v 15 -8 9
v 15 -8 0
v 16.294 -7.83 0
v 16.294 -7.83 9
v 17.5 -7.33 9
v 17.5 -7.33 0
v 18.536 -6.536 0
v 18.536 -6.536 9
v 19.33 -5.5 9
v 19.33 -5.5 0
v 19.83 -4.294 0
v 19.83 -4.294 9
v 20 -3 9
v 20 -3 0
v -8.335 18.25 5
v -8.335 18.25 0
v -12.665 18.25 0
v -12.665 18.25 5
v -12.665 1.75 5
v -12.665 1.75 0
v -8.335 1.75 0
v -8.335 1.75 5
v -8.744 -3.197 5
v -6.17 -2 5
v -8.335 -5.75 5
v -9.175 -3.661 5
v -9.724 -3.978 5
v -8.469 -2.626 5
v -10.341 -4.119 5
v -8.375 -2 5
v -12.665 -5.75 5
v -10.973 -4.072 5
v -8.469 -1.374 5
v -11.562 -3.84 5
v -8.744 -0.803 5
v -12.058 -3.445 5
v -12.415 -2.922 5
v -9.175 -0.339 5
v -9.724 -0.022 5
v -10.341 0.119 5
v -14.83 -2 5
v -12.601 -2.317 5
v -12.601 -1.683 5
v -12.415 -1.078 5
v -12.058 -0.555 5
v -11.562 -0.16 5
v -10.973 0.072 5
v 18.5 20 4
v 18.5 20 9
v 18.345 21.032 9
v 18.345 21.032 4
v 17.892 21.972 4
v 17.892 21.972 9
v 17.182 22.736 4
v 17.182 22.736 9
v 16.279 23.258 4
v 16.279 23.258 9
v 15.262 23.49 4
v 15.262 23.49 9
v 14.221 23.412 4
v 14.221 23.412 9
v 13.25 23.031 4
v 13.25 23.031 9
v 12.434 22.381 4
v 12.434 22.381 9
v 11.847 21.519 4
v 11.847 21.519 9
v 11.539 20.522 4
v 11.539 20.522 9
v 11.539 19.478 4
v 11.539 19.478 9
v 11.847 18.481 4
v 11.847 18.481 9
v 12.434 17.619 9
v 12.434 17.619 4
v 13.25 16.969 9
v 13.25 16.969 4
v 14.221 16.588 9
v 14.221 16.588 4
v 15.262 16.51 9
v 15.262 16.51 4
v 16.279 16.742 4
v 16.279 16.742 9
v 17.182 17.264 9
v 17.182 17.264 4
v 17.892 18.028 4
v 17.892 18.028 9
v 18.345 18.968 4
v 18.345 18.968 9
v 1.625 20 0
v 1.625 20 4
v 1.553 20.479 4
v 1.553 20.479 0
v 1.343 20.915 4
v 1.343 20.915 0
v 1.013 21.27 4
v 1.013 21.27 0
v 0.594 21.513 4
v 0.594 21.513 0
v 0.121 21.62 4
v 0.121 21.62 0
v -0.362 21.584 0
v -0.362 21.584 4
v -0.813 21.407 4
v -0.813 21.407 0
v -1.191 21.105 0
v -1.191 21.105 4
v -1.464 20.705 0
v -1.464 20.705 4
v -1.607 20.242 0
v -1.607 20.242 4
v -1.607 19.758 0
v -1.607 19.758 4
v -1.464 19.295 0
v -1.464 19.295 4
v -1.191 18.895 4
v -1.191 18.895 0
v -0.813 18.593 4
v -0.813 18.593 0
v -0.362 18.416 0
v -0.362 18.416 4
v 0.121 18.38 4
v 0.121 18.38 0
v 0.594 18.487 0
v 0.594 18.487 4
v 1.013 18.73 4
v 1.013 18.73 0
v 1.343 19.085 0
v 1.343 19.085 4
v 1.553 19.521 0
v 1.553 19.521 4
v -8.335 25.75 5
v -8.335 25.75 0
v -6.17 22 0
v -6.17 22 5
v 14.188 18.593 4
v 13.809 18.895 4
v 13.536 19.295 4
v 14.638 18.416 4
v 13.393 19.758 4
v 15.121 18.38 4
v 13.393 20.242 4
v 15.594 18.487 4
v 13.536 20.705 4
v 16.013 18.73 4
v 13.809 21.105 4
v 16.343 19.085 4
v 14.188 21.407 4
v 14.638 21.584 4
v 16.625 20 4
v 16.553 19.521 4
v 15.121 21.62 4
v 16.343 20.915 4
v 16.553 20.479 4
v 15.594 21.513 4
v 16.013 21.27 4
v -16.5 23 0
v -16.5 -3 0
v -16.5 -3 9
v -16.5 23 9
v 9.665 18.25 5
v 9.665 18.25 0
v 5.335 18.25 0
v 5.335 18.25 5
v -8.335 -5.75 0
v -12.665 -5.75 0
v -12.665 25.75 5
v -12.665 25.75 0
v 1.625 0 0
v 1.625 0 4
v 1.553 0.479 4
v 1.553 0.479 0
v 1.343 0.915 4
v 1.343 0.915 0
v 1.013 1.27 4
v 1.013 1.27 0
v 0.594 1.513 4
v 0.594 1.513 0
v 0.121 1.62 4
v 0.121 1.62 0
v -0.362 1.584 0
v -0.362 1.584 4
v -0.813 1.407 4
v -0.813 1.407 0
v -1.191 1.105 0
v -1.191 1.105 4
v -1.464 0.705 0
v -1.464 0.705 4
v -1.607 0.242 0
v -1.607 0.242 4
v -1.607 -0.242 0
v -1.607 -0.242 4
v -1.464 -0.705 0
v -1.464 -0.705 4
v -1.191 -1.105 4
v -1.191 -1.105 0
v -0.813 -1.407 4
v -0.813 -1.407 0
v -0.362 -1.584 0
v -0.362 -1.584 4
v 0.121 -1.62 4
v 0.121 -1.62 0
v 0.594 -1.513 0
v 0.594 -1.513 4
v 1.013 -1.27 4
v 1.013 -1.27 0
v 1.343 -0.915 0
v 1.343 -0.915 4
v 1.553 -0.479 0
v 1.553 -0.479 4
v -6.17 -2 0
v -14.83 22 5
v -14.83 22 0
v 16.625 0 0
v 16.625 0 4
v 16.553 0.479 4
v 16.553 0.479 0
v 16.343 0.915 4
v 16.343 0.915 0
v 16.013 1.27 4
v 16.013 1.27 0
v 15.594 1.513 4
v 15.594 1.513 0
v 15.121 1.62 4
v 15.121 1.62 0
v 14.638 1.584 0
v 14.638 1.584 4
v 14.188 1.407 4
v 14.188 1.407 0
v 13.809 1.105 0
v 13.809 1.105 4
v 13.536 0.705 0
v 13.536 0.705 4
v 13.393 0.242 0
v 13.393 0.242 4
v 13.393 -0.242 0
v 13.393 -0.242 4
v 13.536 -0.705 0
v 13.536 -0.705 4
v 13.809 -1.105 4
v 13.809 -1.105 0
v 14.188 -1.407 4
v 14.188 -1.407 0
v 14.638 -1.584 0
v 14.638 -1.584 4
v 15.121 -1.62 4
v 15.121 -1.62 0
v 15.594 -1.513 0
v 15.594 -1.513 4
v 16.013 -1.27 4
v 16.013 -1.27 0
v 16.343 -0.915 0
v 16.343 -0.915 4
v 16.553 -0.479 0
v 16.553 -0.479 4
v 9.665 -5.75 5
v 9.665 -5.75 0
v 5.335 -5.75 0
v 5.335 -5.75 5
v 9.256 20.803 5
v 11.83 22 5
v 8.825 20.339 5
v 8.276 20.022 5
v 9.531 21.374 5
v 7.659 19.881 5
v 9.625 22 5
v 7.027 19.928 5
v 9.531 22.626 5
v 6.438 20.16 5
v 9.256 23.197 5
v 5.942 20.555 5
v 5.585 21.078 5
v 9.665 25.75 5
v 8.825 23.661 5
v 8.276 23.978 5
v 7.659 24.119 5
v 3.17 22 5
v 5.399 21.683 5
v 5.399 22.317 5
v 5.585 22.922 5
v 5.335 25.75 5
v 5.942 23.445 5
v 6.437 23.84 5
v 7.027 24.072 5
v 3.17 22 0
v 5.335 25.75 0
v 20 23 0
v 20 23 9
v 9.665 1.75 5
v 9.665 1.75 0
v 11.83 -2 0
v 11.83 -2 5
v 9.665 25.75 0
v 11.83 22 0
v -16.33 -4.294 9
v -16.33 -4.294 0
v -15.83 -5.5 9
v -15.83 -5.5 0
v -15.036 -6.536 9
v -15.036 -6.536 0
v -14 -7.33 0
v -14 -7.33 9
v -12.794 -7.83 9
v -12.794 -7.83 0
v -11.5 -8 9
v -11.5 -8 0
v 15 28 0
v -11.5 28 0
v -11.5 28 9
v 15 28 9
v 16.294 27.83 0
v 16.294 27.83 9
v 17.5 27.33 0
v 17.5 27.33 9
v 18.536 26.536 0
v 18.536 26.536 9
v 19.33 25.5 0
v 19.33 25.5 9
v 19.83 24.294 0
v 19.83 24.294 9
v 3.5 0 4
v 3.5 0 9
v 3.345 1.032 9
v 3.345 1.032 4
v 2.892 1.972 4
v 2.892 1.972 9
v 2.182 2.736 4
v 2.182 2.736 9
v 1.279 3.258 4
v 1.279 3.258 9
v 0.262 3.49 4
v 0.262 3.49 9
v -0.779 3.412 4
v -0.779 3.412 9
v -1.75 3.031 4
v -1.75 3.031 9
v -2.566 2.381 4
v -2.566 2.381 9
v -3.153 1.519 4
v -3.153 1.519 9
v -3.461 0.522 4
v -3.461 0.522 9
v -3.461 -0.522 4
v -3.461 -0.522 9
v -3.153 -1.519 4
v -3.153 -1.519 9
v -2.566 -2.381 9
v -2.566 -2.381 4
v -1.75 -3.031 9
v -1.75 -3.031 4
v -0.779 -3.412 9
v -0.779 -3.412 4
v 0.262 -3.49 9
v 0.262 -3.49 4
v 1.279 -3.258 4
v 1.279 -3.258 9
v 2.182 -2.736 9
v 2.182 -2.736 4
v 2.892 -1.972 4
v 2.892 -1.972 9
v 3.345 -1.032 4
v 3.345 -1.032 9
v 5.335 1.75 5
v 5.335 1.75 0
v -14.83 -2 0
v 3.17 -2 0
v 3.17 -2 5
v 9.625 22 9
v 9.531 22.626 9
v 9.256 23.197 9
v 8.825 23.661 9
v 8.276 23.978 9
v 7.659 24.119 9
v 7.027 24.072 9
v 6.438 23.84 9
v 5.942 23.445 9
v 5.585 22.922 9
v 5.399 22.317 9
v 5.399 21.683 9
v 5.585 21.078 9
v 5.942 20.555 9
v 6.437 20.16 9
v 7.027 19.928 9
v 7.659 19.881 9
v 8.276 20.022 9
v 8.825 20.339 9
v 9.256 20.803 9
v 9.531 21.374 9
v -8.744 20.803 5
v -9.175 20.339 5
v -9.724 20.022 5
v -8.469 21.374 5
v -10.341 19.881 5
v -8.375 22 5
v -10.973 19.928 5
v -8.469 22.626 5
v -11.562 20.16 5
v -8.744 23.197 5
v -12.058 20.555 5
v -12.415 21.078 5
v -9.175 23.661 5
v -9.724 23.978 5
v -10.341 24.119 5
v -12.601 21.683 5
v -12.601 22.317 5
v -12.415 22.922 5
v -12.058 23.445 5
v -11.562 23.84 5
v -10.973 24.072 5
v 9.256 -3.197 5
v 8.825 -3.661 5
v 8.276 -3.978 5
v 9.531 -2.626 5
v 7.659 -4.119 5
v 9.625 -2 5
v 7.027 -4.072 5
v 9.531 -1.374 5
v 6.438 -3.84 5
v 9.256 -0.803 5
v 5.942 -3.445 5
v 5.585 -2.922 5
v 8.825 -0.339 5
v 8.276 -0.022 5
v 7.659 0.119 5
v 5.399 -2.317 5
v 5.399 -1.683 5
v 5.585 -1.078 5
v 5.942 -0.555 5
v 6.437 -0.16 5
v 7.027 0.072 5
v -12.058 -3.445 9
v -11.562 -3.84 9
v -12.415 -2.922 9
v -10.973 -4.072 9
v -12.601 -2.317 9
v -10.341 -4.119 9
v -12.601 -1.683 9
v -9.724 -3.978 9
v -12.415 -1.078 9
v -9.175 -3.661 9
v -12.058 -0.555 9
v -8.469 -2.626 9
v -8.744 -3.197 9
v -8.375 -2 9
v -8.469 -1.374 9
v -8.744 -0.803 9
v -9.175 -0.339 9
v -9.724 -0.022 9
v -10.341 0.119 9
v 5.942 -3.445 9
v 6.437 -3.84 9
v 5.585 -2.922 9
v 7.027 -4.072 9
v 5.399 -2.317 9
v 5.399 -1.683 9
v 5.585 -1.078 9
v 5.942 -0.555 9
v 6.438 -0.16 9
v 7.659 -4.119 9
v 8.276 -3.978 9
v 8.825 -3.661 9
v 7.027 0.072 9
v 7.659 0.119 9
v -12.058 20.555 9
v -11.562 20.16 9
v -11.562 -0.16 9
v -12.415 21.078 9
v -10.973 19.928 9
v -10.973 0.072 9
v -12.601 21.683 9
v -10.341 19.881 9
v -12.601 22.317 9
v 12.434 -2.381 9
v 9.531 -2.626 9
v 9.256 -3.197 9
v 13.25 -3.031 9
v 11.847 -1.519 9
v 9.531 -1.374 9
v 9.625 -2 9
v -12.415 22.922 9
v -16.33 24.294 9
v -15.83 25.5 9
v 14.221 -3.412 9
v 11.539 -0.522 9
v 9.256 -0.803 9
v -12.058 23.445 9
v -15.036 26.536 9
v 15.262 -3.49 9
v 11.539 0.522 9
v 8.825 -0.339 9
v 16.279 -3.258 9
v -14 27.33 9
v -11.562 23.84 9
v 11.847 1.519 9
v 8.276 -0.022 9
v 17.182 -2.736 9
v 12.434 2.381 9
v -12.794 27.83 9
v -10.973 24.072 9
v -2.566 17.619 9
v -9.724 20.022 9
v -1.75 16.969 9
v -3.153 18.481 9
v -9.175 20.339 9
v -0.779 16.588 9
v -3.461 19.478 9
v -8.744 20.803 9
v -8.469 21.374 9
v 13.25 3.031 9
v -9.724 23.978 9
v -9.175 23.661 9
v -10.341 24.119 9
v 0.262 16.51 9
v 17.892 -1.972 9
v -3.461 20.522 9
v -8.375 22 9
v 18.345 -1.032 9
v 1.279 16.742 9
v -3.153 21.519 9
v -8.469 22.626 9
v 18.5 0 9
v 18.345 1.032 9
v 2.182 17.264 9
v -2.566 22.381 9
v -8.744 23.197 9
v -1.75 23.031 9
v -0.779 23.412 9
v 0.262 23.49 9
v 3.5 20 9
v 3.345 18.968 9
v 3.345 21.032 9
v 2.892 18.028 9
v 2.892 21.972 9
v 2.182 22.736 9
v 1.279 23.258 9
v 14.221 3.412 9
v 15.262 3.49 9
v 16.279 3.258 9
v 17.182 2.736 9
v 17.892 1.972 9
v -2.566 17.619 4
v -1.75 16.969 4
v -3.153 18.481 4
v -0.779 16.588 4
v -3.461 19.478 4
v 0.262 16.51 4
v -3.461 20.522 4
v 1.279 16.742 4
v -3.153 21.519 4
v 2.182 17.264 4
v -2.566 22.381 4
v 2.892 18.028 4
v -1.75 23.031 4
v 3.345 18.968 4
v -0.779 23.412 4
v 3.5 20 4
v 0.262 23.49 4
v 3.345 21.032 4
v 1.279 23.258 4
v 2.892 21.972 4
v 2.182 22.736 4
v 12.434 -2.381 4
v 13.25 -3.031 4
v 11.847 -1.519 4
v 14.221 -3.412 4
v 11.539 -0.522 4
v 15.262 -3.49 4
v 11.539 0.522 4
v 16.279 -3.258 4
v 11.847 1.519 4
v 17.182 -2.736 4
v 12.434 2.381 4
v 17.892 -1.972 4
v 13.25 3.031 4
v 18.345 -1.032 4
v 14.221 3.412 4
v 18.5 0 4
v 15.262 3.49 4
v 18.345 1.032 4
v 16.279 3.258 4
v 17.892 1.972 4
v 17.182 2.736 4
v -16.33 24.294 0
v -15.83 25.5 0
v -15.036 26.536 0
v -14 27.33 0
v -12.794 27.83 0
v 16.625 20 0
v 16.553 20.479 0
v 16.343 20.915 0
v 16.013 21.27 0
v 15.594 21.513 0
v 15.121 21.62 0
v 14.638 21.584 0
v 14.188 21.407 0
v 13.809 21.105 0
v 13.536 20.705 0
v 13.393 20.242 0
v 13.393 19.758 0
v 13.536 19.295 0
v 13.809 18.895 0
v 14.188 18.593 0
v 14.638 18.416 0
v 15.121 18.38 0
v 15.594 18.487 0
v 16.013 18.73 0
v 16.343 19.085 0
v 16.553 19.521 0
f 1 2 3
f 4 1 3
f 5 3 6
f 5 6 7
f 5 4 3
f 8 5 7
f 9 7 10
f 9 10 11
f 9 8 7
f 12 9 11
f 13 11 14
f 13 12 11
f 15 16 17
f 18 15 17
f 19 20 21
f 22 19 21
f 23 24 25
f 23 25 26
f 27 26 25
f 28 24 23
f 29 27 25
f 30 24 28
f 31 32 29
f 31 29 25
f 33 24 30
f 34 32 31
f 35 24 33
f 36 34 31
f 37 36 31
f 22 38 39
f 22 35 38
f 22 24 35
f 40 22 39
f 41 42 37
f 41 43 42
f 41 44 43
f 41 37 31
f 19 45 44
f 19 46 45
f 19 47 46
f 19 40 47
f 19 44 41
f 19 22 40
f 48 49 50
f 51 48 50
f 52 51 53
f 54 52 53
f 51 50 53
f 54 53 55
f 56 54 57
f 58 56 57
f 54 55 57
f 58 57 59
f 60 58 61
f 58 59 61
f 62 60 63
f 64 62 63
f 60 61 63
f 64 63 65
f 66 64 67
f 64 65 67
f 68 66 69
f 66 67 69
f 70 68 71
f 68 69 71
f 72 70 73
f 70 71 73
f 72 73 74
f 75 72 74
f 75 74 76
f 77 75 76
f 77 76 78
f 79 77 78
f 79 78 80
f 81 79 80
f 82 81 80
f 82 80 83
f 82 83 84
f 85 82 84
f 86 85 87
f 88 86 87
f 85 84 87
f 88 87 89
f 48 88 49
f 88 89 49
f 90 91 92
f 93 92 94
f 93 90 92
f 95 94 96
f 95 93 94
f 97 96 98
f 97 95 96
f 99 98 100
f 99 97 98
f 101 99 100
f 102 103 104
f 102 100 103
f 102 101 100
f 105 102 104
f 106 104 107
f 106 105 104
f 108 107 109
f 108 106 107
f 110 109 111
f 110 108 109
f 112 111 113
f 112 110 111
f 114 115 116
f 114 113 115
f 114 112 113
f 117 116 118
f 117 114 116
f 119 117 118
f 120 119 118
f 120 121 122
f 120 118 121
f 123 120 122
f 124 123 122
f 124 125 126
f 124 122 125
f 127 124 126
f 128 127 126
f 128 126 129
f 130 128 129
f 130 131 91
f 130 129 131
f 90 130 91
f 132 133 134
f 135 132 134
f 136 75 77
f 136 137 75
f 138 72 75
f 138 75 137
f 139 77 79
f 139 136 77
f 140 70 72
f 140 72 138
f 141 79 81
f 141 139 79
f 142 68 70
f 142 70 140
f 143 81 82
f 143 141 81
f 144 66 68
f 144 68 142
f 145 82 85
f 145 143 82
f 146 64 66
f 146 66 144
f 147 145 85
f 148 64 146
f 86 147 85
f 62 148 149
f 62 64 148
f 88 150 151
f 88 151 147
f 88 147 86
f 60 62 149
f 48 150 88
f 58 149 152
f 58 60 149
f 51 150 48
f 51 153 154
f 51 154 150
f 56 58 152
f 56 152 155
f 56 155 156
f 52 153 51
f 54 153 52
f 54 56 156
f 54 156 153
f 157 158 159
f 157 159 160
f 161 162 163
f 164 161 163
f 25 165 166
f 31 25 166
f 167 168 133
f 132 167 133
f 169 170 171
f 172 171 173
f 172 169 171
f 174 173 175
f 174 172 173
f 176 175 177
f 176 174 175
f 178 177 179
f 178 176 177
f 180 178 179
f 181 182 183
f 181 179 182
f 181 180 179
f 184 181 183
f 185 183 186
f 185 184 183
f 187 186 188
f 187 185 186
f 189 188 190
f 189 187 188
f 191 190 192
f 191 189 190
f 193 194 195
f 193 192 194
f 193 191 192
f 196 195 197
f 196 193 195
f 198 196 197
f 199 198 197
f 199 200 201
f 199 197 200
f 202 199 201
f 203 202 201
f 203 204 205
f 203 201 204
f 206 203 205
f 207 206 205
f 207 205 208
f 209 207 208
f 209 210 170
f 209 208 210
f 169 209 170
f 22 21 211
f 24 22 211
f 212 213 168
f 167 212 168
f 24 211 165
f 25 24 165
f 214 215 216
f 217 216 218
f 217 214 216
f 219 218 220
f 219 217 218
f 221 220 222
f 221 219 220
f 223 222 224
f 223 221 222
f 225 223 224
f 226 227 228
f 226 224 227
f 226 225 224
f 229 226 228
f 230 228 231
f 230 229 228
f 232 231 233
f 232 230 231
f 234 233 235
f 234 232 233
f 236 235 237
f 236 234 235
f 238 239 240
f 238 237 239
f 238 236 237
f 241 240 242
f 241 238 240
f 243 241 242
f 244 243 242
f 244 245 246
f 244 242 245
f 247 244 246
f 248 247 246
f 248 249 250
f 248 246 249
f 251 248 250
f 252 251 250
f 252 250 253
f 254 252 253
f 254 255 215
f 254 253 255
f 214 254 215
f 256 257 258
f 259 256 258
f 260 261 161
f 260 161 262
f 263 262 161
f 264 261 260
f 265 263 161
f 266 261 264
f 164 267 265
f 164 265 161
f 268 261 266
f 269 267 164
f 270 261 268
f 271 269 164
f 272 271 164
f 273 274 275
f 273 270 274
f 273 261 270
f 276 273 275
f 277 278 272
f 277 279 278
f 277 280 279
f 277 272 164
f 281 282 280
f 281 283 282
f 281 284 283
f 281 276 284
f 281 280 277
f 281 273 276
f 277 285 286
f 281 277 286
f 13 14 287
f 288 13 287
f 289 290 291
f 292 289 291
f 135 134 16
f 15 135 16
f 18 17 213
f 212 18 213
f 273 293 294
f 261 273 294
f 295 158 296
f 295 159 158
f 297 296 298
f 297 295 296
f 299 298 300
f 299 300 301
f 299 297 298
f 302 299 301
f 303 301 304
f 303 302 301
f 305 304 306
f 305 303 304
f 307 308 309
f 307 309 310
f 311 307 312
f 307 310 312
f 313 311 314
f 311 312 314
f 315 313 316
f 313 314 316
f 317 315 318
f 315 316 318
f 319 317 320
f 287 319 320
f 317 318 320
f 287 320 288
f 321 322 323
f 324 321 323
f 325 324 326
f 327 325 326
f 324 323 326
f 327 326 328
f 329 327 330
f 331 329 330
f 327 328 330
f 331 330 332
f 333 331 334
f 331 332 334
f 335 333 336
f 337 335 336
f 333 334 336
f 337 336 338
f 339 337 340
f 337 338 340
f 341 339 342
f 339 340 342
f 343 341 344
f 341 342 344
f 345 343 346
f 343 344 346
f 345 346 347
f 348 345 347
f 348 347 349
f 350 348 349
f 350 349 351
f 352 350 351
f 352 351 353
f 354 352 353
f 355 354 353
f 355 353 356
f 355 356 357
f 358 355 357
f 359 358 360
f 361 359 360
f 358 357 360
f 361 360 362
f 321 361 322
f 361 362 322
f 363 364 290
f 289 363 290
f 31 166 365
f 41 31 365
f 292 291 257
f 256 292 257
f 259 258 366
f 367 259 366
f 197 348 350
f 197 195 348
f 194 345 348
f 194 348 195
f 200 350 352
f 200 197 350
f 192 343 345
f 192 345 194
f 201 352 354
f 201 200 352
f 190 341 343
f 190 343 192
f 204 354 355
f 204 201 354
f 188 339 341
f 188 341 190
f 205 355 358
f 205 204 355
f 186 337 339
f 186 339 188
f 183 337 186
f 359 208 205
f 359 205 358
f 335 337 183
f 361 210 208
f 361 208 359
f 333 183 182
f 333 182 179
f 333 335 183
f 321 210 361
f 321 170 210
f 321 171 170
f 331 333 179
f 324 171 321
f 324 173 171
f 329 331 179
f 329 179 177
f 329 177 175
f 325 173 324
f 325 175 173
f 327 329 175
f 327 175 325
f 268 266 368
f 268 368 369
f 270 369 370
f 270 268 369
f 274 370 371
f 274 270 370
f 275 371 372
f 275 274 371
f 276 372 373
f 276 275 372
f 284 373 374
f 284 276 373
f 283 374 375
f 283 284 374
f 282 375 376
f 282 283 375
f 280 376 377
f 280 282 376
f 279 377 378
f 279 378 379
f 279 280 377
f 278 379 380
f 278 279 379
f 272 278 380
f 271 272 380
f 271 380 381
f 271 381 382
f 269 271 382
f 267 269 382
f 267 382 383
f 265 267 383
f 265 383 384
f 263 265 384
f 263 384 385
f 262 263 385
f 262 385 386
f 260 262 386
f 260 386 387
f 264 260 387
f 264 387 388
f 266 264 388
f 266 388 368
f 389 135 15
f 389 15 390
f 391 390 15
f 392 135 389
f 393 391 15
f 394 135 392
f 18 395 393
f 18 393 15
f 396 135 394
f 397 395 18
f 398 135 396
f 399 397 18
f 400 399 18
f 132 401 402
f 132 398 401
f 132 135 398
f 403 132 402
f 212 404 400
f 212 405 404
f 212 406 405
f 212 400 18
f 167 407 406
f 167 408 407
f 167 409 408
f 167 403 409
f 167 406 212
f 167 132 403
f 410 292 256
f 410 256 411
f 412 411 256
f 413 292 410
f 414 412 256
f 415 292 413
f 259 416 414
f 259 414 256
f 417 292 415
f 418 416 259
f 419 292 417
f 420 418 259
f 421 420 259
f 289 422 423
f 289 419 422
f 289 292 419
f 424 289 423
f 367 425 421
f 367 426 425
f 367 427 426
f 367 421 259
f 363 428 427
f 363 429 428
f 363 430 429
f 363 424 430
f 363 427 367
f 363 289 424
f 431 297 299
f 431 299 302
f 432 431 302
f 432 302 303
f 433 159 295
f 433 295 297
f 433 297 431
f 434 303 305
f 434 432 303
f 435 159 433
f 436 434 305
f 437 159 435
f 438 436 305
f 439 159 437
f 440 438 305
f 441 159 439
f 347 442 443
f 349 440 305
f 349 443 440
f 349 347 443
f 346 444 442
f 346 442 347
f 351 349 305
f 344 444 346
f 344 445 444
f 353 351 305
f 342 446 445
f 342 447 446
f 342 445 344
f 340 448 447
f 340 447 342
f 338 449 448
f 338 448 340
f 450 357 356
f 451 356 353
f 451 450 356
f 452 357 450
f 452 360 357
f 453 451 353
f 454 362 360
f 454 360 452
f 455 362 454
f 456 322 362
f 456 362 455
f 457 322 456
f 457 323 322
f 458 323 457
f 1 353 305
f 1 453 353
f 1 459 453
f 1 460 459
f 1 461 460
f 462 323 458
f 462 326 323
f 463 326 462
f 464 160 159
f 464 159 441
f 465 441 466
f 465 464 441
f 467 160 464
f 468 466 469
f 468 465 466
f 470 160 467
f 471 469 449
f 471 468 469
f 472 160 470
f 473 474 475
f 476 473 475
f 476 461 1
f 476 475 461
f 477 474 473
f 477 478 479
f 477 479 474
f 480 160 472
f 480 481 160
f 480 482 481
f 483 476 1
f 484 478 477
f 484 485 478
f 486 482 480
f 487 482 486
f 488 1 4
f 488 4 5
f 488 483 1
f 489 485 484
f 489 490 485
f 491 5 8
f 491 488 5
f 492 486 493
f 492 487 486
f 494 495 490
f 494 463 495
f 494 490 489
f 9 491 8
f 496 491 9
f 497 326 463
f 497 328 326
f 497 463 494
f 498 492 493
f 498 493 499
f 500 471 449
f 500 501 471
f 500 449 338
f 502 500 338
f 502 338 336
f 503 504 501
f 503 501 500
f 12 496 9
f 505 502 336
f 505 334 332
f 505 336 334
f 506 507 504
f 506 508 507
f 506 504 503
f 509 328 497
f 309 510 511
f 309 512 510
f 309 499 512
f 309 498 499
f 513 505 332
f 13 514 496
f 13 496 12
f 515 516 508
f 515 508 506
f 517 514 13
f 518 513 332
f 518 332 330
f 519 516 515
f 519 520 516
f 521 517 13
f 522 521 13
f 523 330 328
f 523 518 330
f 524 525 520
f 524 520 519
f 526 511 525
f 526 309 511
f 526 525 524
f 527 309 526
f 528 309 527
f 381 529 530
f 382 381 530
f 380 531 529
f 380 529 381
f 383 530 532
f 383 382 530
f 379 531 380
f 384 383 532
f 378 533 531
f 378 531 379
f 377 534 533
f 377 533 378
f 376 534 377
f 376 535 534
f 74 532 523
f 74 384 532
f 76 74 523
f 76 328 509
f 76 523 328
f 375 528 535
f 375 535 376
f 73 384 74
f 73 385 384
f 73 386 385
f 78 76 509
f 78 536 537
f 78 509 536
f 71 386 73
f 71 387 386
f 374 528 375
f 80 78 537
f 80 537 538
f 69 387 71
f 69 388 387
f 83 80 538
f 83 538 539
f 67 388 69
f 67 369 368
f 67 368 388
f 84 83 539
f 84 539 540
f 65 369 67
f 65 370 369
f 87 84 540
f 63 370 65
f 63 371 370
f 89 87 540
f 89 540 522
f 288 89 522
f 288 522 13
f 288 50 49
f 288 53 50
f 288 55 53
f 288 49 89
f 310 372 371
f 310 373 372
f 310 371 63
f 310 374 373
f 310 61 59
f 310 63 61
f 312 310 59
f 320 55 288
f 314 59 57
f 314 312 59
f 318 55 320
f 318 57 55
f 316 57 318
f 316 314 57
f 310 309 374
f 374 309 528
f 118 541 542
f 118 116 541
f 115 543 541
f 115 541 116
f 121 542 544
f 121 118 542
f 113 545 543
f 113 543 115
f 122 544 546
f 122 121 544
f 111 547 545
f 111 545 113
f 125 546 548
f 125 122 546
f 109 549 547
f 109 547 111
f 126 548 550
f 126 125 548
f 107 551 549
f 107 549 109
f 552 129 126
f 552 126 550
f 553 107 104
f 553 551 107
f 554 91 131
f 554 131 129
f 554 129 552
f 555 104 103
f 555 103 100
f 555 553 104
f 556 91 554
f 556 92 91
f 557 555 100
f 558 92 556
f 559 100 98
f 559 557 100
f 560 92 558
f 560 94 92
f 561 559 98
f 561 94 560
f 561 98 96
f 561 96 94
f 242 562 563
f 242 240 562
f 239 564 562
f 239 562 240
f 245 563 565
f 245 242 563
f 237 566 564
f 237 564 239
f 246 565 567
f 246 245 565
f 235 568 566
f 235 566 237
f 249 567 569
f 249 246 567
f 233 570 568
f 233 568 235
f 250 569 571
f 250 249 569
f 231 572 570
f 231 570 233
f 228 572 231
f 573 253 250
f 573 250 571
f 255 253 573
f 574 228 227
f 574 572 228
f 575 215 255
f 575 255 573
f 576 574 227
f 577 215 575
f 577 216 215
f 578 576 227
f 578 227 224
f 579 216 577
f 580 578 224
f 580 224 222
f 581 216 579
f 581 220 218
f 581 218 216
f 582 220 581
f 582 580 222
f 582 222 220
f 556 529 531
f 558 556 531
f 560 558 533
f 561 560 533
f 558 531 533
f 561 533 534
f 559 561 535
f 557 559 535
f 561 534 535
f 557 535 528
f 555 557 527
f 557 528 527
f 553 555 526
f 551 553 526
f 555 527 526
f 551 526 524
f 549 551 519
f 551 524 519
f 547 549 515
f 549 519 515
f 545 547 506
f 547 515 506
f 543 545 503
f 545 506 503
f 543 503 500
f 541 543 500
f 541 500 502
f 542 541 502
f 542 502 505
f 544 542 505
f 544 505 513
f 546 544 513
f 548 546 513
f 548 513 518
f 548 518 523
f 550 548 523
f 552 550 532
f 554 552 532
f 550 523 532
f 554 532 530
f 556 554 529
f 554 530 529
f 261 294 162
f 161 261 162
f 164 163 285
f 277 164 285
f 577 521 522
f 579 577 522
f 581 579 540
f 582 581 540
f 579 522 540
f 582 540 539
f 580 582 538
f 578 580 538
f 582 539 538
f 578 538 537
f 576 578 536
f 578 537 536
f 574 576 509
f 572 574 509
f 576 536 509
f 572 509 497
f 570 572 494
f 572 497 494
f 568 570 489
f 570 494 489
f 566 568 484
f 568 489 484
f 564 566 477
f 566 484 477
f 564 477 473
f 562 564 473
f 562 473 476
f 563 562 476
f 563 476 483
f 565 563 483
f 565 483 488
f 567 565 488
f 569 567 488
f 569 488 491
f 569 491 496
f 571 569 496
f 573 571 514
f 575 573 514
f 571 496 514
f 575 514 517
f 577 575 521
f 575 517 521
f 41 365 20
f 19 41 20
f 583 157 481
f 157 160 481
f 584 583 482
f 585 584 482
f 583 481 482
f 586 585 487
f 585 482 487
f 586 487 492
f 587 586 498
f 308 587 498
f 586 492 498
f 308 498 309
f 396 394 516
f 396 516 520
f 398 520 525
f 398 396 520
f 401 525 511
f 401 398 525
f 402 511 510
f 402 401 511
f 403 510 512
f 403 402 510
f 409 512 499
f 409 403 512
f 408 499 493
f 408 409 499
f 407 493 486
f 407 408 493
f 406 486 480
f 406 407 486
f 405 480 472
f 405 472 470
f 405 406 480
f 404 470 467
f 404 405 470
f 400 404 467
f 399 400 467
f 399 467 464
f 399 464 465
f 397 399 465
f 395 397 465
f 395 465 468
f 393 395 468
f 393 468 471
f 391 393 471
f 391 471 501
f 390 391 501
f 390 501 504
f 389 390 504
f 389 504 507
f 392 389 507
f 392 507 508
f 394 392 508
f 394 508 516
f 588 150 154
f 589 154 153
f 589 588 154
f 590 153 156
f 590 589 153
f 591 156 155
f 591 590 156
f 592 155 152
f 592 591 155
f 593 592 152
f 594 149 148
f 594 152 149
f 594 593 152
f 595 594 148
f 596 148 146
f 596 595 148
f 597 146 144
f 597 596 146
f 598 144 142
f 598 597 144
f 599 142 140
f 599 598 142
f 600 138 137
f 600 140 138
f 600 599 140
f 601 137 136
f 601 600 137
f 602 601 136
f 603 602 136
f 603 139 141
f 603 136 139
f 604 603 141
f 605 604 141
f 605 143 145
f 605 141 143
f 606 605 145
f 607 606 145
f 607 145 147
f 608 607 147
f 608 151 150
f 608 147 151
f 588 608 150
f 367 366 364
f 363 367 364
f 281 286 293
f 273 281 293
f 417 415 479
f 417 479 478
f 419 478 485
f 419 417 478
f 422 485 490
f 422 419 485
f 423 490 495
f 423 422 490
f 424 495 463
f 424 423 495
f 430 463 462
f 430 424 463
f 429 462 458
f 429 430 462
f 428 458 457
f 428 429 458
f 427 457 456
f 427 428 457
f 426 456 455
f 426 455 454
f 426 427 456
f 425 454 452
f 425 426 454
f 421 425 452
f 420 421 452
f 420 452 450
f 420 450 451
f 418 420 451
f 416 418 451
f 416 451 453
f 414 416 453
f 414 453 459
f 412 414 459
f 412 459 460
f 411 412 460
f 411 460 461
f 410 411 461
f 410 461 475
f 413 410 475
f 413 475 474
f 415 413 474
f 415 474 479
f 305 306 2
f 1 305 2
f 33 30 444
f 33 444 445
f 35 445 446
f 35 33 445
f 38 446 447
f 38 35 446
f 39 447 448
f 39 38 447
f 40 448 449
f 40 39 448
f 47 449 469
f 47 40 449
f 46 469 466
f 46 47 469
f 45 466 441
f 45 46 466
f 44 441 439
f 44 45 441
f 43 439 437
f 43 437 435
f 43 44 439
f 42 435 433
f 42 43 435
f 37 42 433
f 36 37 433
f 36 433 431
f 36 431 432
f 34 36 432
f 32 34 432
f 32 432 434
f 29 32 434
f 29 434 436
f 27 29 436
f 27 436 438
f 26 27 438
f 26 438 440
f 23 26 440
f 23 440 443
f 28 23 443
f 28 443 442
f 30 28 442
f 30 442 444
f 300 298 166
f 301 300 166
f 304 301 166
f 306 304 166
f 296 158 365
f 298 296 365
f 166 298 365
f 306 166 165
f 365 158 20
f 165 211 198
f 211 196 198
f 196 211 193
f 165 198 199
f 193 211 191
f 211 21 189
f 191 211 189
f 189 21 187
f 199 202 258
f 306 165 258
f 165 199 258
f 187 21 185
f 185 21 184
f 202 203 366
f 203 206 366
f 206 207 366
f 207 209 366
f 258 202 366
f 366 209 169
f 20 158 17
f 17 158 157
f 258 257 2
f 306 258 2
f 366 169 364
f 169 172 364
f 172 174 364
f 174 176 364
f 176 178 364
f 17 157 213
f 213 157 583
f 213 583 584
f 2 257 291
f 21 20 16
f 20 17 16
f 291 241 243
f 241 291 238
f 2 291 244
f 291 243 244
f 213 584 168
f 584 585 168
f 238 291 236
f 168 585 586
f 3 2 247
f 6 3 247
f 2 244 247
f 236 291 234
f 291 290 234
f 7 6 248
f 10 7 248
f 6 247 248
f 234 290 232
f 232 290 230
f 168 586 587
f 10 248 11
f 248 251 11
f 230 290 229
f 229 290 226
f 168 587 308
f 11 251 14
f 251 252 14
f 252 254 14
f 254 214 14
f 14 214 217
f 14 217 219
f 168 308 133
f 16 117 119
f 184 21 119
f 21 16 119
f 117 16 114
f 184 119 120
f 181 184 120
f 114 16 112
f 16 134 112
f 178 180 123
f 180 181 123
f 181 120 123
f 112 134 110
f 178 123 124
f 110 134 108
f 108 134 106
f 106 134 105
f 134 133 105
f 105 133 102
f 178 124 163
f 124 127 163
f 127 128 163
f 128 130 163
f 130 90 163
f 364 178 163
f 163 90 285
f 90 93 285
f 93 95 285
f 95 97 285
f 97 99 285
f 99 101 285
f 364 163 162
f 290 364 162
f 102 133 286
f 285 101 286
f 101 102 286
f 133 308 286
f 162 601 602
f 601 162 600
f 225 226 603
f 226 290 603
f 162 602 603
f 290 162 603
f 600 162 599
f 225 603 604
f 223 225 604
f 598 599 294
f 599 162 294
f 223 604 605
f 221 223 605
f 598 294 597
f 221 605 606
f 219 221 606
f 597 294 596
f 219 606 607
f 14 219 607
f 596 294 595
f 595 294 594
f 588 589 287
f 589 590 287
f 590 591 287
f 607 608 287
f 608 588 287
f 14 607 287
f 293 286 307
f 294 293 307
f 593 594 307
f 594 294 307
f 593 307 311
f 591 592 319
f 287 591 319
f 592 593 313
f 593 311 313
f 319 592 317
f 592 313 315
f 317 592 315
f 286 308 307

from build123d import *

# Parameters (mm, degrees)
SKETCH1_W           = 36.5
SKETCH1_H           = 36
SKETCH1_R           = 1.625
SKETCH1_R_2         = 2.125
BOSS_EXTRUDE1_DEPTH = 9
SKETCH2_R           = 3.5
CUT_EXTRUDE1_DEPTH  = 5
CUT_EXTRUDE2_DEPTH  = 5
FILLET2_R           = 5


with BuildPart() as part:
    # Sketch1 → Boss-Extrude1 (new body)
    with BuildSketch(Plane.XY):
        with Locations((1.75, 10)):
            Rectangle(SKETCH1_W, SKETCH1_H)
        with Locations((0, 20)):
            Circle(SKETCH1_R, mode=Mode.SUBTRACT)
        with Locations((15, 20)):
            Circle(SKETCH1_R, mode=Mode.SUBTRACT)
        with Locations((15, 0)):
            Circle(SKETCH1_R, mode=Mode.SUBTRACT)
        Circle(SKETCH1_R, mode=Mode.SUBTRACT)
        with Locations((-10.5, 22)):
            Circle(SKETCH1_R_2, mode=Mode.SUBTRACT)
        with Locations((7.5, 22)):
            Circle(SKETCH1_R_2, mode=Mode.SUBTRACT)
        with Locations((7.5, -2)):
            Circle(SKETCH1_R_2, mode=Mode.SUBTRACT)
        with Locations((-10.5, -2)):
            Circle(SKETCH1_R_2, mode=Mode.SUBTRACT)
    extrude(amount=BOSS_EXTRUDE1_DEPTH)

    # Sketch2 → Cut-Extrude1 (cut)
    with BuildSketch(Plane.XY.offset(9)):
        with Locations((0, 20)):
            Circle(SKETCH2_R)
        Circle(SKETCH2_R)
        with Locations((15, 0)):
            Circle(SKETCH2_R)
        with Locations((15, 20)):
            Circle(SKETCH2_R)
    extrude(amount=-CUT_EXTRUDE1_DEPTH, mode=Mode.SUBTRACT)

    # Sketch3 → Cut-Extrude2 (cut)
    with BuildSketch(Plane(origin=(0, 0, 0), x_dir=(-1, 0, 0), z_dir=(0, 0, -1))):
        Polygon((-5.334936491, 18.25), (-3.169872981, 22), (-5.334936491, 25.75), (-9.665063509, 25.75), (-11.830127019, 22), (-9.665063509, 18.25), align=None)
        Polygon((12.665063509, 18.25), (14.830127019, 22), (12.665063509, 25.75), (8.334936491, 25.75), (6.169872981, 22), (8.334936491, 18.25), align=None)
        Polygon((12.665063509, -5.75), (14.830127019, -2), (12.665063509, 1.75), (8.334936491, 1.75), (6.169872981, -2), (8.334936491, -5.75), align=None)
        Polygon((-9.665063509, -5.75), (-5.334936491, -5.75), (-3.169872981, -2), (-5.334936491, 1.75), (-9.665063509, 1.75), (-11.830127019, -2), align=None)
    extrude(amount=-CUT_EXTRUDE2_DEPTH, mode=Mode.SUBTRACT)

    # Fillet2
    fillet2_edges = [part.edges().sort_by_distance(p)[0] for p in [
        (-16.5, 28, 4.5),
        (20, 28, 4.5),
        (20, -8, 4.5),
        (-16.5, -8, 4.5),
    ]]
    fillet(fillet2_edges, radius=FILLET2_R)


solid = part.part
